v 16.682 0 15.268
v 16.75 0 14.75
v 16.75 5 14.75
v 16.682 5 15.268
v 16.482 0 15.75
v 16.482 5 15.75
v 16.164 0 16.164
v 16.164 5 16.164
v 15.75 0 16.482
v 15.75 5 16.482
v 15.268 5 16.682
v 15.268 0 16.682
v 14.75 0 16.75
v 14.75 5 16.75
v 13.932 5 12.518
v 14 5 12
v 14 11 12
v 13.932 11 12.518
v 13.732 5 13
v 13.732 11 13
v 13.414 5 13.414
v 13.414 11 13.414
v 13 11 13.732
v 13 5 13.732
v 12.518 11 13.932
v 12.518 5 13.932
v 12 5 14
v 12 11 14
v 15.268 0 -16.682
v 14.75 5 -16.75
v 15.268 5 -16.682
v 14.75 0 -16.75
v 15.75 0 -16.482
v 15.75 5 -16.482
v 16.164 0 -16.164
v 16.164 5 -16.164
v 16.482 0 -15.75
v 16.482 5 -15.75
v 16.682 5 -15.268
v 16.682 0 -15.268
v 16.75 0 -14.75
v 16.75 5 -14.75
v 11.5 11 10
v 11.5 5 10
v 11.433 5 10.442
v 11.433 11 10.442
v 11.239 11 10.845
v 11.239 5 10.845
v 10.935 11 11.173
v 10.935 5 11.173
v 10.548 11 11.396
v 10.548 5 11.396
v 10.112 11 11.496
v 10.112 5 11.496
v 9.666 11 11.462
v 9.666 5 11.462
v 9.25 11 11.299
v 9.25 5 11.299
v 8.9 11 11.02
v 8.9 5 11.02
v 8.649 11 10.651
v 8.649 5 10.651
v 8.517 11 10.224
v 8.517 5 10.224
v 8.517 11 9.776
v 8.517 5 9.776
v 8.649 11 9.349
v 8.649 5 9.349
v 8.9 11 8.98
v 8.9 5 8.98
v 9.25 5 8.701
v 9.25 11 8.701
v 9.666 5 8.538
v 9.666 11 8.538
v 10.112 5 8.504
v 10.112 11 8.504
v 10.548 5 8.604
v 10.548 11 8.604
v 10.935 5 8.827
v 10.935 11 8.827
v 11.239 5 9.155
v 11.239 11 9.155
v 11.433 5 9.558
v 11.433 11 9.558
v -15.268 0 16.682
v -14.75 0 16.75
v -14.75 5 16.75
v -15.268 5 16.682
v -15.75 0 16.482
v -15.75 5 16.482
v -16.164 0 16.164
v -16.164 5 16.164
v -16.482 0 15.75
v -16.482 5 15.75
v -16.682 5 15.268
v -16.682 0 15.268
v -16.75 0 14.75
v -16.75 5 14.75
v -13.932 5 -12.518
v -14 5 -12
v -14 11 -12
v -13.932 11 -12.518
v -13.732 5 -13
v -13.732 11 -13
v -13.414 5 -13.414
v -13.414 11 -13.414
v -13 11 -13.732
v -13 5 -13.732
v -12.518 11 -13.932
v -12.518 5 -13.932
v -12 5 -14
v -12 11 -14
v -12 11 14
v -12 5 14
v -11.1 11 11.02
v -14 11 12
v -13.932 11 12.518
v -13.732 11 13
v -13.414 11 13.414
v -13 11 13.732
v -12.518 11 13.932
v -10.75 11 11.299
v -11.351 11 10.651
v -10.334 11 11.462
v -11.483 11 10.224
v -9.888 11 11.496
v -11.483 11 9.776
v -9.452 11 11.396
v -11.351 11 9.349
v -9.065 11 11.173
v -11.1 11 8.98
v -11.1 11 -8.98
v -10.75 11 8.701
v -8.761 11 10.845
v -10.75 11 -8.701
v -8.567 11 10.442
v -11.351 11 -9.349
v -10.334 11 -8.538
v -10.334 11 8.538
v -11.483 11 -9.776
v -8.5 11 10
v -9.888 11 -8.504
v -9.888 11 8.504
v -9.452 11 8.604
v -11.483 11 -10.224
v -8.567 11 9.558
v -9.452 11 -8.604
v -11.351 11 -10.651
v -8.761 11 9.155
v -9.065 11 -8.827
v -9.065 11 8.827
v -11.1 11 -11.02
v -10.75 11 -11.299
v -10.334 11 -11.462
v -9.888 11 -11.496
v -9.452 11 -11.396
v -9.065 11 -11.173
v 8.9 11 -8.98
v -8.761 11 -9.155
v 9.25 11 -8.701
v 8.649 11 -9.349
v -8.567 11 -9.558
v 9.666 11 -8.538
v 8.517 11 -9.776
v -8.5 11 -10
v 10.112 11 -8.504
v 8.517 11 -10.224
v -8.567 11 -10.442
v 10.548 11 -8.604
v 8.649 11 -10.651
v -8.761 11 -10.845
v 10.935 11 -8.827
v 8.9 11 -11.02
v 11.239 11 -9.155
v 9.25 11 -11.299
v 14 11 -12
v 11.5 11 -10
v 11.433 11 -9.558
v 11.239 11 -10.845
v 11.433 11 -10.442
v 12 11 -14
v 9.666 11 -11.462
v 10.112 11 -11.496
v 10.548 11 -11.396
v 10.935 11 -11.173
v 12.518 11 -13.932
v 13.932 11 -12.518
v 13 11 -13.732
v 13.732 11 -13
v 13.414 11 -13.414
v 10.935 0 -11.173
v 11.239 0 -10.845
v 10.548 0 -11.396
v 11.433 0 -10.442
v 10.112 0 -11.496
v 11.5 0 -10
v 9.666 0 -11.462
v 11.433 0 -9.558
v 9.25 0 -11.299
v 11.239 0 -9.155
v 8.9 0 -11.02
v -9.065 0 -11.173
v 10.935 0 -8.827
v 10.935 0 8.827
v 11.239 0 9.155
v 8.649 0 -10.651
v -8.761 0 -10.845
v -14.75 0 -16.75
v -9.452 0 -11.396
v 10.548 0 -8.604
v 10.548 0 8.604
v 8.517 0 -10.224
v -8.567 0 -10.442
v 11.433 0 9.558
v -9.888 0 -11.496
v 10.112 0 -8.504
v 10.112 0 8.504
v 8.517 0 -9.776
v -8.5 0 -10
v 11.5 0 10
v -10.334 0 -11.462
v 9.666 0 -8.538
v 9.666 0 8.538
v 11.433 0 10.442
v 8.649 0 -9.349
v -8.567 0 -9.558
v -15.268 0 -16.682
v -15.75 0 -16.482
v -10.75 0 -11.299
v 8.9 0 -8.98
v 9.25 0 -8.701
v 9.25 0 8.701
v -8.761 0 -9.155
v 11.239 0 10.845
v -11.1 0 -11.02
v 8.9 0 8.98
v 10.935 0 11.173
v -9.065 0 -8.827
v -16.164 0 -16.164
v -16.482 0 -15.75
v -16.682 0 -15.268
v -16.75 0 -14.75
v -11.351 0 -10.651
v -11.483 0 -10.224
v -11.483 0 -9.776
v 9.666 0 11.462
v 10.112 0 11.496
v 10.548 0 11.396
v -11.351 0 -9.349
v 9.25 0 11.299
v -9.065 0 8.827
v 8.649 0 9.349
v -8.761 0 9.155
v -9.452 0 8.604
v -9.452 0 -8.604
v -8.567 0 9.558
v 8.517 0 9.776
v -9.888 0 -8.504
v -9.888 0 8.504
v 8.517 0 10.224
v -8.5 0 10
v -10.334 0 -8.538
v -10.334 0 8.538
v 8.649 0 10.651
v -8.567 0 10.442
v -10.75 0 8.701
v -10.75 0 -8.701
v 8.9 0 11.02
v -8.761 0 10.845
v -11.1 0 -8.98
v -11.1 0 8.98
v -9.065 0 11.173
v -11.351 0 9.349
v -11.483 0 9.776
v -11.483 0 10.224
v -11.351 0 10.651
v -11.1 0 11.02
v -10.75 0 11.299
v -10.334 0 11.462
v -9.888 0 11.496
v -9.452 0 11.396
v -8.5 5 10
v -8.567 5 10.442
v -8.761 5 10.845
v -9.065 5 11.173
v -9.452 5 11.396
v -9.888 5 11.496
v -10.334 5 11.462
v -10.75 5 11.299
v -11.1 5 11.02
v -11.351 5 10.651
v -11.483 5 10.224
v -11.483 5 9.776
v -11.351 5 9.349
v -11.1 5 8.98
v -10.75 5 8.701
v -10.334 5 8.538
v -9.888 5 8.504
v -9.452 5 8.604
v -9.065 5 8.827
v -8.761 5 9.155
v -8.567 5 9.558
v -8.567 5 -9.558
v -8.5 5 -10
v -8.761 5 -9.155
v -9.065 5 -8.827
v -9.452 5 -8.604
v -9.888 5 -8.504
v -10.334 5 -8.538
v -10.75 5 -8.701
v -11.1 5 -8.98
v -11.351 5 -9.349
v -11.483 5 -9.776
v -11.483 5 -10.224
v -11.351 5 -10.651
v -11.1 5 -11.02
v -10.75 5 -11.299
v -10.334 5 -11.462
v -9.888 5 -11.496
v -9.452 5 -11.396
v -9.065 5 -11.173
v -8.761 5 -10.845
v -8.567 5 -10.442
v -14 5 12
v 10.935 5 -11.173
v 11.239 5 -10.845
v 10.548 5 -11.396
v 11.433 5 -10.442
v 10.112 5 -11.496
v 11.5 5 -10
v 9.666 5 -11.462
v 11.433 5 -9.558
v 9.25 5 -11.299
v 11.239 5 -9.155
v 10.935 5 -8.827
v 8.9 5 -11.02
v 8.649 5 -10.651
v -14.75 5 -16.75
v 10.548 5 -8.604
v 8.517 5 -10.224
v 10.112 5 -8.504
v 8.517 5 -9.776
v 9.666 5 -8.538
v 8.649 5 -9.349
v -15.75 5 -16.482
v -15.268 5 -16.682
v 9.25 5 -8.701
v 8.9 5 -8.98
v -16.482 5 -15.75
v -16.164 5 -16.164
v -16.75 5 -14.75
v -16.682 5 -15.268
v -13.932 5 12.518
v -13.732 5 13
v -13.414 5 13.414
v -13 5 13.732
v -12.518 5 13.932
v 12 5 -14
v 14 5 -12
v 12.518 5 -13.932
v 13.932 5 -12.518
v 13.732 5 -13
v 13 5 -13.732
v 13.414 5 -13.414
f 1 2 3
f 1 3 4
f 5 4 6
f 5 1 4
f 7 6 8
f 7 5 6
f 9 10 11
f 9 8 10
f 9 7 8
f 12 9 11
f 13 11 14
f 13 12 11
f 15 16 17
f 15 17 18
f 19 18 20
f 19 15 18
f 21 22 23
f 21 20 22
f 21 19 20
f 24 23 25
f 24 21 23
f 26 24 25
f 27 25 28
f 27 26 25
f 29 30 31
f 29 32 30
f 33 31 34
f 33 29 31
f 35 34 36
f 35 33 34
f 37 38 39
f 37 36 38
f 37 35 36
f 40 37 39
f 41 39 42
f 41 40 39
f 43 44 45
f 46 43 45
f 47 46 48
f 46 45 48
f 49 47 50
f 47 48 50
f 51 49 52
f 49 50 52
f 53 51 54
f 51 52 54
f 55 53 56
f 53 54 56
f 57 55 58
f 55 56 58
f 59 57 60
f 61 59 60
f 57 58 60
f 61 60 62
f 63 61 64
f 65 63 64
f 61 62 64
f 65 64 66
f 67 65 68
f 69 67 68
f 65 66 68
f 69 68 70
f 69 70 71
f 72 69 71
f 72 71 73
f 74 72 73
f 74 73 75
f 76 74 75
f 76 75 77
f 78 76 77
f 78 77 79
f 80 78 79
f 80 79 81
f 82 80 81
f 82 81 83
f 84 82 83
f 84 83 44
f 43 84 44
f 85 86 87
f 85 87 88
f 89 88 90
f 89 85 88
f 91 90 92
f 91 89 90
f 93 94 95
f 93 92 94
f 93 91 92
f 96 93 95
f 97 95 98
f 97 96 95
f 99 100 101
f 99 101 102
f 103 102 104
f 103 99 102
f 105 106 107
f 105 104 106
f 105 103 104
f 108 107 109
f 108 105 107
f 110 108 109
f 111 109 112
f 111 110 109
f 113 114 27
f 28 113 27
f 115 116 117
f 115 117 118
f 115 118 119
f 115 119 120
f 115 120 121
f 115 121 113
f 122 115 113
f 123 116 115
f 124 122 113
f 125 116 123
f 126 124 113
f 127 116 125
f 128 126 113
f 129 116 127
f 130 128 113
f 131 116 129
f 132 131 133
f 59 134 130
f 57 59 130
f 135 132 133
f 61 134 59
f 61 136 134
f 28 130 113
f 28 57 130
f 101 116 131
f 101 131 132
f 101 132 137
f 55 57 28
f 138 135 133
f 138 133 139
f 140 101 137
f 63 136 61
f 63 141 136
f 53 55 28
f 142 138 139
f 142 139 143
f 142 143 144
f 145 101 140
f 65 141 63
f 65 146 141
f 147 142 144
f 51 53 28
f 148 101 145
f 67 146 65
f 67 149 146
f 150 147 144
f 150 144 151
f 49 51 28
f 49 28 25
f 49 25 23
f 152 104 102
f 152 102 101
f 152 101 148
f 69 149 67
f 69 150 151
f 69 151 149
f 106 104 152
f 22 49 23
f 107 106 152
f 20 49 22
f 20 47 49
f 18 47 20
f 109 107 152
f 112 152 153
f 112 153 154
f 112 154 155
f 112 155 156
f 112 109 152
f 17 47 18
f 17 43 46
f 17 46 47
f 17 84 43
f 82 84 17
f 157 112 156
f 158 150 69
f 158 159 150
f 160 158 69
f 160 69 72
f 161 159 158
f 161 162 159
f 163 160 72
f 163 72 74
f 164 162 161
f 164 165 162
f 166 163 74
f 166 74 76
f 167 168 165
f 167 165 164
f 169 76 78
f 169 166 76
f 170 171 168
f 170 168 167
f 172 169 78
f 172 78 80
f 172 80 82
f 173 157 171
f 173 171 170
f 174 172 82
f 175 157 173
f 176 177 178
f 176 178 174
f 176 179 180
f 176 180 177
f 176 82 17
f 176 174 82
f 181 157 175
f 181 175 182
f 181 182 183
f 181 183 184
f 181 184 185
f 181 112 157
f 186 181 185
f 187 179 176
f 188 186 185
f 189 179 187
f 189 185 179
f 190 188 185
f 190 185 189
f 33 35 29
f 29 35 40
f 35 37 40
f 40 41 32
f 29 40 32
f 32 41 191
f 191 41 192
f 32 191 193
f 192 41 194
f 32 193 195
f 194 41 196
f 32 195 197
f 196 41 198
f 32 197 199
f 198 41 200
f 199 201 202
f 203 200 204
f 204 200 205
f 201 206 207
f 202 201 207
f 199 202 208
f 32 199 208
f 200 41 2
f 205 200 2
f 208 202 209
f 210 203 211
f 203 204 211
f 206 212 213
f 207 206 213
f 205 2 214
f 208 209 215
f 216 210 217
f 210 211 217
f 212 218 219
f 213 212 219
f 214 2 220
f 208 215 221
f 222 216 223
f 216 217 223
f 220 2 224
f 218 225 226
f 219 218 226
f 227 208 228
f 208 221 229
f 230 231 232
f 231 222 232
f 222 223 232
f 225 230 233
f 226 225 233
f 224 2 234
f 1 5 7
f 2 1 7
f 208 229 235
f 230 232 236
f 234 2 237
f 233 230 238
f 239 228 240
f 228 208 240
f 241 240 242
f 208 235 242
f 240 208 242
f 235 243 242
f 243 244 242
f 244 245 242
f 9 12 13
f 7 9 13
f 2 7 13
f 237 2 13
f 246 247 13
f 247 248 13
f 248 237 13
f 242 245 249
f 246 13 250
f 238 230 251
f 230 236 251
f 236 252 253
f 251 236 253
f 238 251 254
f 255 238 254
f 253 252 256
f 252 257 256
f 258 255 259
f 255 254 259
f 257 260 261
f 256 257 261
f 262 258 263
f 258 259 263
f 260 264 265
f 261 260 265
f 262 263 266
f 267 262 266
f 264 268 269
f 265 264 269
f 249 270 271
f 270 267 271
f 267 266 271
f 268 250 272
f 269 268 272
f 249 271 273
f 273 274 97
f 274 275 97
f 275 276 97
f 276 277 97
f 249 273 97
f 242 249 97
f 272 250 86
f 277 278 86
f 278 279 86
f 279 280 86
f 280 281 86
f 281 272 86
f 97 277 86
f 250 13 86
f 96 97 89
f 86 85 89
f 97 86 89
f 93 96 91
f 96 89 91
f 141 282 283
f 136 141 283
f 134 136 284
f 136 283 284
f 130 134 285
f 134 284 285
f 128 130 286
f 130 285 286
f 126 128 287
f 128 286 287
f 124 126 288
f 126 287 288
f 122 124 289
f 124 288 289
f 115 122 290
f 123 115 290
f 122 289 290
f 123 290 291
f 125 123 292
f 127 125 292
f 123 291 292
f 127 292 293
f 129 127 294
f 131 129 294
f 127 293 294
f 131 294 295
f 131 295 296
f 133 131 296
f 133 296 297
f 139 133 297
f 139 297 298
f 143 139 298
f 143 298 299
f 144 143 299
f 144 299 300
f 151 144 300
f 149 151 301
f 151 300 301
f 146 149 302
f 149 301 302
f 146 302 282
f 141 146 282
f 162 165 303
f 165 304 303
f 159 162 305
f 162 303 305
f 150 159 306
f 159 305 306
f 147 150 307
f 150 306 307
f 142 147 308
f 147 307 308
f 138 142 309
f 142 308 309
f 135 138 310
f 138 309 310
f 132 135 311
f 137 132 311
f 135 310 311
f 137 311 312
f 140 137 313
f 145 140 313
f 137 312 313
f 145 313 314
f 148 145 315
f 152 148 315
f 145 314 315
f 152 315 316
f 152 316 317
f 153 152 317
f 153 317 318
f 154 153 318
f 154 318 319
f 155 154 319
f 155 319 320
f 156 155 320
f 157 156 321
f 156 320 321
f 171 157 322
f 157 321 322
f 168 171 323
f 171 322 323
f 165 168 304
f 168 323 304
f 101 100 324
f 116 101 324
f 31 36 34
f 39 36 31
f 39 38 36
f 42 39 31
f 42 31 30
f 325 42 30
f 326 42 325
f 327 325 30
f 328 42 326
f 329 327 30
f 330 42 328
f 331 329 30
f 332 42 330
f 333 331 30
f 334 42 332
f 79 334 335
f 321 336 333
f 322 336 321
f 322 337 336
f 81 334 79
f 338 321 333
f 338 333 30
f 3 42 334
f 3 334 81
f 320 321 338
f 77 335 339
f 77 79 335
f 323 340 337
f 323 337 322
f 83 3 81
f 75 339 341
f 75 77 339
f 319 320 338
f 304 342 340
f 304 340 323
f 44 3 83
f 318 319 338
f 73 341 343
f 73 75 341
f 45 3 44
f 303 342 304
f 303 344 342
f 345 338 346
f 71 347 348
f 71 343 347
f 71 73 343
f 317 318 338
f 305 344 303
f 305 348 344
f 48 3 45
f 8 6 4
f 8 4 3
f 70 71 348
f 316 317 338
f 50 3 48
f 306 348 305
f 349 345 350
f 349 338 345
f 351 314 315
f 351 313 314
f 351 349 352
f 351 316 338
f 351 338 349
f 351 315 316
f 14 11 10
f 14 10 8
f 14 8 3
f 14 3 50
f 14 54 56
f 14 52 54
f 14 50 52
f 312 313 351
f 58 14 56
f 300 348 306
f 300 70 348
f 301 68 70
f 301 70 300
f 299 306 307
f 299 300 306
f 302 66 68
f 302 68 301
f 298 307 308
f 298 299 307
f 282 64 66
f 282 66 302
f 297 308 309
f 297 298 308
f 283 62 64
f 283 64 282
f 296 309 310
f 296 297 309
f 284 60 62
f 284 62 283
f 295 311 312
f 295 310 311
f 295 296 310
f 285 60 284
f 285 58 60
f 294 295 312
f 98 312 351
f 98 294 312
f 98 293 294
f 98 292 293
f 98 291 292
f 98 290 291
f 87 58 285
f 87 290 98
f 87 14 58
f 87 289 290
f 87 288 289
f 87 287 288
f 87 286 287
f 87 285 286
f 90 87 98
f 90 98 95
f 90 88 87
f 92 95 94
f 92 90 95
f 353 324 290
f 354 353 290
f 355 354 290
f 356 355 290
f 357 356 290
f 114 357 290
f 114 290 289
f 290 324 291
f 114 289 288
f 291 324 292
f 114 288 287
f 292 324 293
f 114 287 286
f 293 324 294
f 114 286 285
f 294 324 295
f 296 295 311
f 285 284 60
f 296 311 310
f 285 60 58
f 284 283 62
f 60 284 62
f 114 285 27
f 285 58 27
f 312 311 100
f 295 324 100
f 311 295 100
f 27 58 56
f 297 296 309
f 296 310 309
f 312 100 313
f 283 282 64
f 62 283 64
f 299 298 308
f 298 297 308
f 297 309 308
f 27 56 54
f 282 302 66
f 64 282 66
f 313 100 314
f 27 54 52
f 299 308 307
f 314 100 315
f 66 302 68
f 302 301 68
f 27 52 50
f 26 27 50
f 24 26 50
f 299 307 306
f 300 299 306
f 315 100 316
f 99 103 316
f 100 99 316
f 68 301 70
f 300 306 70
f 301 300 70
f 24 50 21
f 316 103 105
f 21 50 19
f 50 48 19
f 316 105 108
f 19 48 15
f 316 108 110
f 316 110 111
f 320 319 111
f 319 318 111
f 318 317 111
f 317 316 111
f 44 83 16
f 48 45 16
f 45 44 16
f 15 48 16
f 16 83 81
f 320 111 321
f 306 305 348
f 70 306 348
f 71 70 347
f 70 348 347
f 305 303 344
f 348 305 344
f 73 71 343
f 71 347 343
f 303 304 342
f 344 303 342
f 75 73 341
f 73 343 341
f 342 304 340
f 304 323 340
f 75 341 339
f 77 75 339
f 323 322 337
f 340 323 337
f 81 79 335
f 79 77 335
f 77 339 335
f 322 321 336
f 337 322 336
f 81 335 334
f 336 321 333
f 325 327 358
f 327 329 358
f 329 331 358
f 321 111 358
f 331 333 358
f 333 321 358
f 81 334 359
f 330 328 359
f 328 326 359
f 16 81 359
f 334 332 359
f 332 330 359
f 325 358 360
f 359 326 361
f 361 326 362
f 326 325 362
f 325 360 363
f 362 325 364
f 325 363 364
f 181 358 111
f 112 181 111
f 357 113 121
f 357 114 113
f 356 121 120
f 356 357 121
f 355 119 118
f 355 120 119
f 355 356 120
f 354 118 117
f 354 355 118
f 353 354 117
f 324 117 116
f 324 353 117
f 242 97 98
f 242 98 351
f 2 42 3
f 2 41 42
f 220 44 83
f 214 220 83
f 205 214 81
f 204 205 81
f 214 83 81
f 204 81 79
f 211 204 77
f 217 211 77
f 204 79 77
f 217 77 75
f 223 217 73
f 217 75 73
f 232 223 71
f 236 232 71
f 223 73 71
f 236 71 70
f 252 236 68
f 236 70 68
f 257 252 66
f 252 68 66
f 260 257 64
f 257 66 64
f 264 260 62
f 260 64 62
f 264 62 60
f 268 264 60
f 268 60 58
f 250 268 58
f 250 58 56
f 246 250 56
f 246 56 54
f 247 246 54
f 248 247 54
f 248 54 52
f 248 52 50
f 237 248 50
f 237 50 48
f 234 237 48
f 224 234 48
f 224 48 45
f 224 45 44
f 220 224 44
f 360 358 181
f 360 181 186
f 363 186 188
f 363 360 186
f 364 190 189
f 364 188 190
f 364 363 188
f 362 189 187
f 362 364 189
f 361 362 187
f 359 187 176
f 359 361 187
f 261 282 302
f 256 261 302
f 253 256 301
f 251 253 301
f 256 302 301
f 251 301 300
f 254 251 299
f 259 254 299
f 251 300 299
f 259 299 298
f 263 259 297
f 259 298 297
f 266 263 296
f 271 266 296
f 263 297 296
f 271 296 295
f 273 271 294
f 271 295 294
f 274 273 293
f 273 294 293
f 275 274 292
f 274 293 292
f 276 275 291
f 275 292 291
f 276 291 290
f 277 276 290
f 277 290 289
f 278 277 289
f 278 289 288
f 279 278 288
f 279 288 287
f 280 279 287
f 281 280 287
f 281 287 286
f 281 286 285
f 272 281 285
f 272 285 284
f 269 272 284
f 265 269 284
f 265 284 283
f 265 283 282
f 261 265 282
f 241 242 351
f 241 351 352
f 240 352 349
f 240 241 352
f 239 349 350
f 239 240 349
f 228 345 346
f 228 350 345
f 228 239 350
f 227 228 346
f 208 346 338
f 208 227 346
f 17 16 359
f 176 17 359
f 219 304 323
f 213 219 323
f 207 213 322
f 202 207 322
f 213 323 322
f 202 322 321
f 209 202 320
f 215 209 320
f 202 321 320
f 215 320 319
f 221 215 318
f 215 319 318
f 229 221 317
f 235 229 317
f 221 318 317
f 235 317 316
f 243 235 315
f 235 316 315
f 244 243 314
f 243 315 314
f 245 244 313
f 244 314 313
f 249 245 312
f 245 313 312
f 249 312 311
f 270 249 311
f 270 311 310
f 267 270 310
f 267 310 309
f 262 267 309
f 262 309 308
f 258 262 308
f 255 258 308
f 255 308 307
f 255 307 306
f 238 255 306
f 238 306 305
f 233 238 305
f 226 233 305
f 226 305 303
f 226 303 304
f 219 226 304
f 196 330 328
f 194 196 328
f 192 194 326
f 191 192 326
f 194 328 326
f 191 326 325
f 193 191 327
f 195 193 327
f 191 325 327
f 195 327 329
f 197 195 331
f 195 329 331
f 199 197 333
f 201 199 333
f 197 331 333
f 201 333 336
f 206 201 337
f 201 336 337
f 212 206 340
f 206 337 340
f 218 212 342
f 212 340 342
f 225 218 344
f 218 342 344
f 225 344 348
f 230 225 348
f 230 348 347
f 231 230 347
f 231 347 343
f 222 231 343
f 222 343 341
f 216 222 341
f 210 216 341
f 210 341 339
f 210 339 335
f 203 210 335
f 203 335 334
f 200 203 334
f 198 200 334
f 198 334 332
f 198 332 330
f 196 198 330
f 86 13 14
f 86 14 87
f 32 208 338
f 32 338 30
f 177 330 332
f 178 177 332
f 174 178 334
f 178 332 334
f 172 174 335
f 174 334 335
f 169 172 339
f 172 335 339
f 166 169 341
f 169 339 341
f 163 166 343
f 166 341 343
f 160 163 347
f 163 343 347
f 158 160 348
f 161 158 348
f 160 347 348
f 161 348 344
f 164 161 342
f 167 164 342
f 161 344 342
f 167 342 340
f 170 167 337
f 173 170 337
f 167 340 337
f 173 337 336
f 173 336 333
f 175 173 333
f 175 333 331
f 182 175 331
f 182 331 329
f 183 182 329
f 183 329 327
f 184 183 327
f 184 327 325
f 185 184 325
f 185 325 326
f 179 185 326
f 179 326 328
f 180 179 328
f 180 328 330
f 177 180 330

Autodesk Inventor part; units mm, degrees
ref_plane "YZ Plane" through (0, 0, 0) normal (1, 0, 0) x (0, 1, 0)
ref_plane "XZ Plane" through (0, 0, 0) normal (0, 1, 0) x (-1, 0, 0)
ref_plane "XY Plane" through (0, 0, 0) normal (0, 0, 1) x (1, 0, 0)
sketch "Эскиз1" plane through (0, 0, 0) normal (0, 1, 0) x (-1, 0, 0)
  line L0 (-14.75, 16.75) -> (14.75, 16.75)
  line L1 (16.75, 14.75) -> (16.75, -14.75)
  line L2 (14.75, -16.75) -> (-14.75, -16.75)
  line L3 (-16.75, -14.75) -> (-16.75, 14.75)
  line L4 (-16.75, 16.75) -> (16.75, -16.75) construction
  line L5 (16.75, 16.75) -> (-16.75, -16.75) construction
  arc A0 (16.75, 14.75) -> (14.75, 16.75) centre (14.75, 14.75) ccw
  arc A1 (14.75, -16.75) -> (16.75, -14.75) centre (14.75, -14.75) ccw
  arc A2 (-16.75, -14.75) -> (-14.75, -16.75) centre (-14.75, -14.75) ccw
  arc A3 (-14.75, 16.75) -> (-16.75, 14.75) centre (-14.75, 14.75) ccw
  point P0 (0, 0)
  dimension "d0" = 33.5
  dimension "d1" = 33.5
  dimension "d2" = 2
extrude "Выдавливание1" add sketch "Эскиз1" along normal blind 5
sketch "Эскиз2" plane through (0, 5, 0) normal (0, 1, 0) x (1, 0, 0)
  line L0 (12, 14) -> (-12, 14)
  line L1 (-14, 12) -> (-14, -12)
  line L2 (-12, -14) -> (12, -14)
  line L3 (14, -12) -> (14, 12)
  line L4 (14, 14) -> (-14, -14) construction
  line L5 (-14, 14) -> (14, -14) construction
  line L6 (10, -10) -> (-10, -10)
  line L7 (-10, -10) -> (-10, 10)
  line L8 (-10, 10) -> (10, 10)
  line L9 (10, 10) -> (10, -10)
  line L10 (10, -10) -> (-10, 10) construction
  line L11 (-10, -10) -> (10, 10) construction
  circle A0 centre (-10, -10) radius 1.5
  circle A1 centre (-10, 10) radius 1.5
  circle A2 centre (10, 10) radius 1.5
  circle A3 centre (10, -10) radius 1.5
  arc A4 (-14, -12) -> (-12, -14) centre (-12, -12) ccw
  arc A5 (12, -14) -> (14, -12) centre (12, -12) ccw
  arc A6 (14, 12) -> (12, 14) centre (12, 12) ccw
  arc A7 (-12, 14) -> (-14, 12) centre (-12, 12) ccw
  point P0 (0, 0)
  dimension "d5" = 28
  dimension "d6" = 28
  dimension "d7" = 20
  dimension "d8" = 20
  dimension "d9" = 3
  dimension "d10" = 3
  dimension "d11" = 3
  dimension "d12" = 3
  dimension "d13" = 2
extrude "Выдавливание2" add sketch "Эскиз2" along normal blind 6 separate body contours A6 L3 A5 L2 A4 L1 A7 L0 | A0 L7 A1 L8 A2 L9 A3 L6
sketch "Эскиз3" plane through (0, 11, 0) normal (0, 1, 0) x (1, 0, 0)
  arc A0 (-12, 14) -> (-14, 12) centre (-12, 12) ccw projected
  line L0 (-14, 12) -> (-14, -12) projected
  arc A1 (-14, -12) -> (-12, -14) centre (-12, -12) ccw projected
  line L1 (-12, -14) -> (12, -14) projected
  arc A2 (12, -14) -> (14, -12) centre (12, -12) ccw projected
  line L2 (14, -12) -> (14, 12) projected
  arc A3 (14, 12) -> (12, 14) centre (12, 12) ccw projected
  line L3 (12, 14) -> (-12, 14) projected
  circle A4 centre (10, 10) radius 1.5 projected
  circle A5 centre (-10, 10) radius 1.5 projected
  circle A6 centre (-10, -10) radius 1.5 projected
  circle A7 centre (10, -10) radius 1.5 projected
  point P0 (0, 0)
extrude "Выдавливание3" cut sketch "Эскиз3" against normal blind 20 contours A4 | A5 | A6 | A7 bodies 1
